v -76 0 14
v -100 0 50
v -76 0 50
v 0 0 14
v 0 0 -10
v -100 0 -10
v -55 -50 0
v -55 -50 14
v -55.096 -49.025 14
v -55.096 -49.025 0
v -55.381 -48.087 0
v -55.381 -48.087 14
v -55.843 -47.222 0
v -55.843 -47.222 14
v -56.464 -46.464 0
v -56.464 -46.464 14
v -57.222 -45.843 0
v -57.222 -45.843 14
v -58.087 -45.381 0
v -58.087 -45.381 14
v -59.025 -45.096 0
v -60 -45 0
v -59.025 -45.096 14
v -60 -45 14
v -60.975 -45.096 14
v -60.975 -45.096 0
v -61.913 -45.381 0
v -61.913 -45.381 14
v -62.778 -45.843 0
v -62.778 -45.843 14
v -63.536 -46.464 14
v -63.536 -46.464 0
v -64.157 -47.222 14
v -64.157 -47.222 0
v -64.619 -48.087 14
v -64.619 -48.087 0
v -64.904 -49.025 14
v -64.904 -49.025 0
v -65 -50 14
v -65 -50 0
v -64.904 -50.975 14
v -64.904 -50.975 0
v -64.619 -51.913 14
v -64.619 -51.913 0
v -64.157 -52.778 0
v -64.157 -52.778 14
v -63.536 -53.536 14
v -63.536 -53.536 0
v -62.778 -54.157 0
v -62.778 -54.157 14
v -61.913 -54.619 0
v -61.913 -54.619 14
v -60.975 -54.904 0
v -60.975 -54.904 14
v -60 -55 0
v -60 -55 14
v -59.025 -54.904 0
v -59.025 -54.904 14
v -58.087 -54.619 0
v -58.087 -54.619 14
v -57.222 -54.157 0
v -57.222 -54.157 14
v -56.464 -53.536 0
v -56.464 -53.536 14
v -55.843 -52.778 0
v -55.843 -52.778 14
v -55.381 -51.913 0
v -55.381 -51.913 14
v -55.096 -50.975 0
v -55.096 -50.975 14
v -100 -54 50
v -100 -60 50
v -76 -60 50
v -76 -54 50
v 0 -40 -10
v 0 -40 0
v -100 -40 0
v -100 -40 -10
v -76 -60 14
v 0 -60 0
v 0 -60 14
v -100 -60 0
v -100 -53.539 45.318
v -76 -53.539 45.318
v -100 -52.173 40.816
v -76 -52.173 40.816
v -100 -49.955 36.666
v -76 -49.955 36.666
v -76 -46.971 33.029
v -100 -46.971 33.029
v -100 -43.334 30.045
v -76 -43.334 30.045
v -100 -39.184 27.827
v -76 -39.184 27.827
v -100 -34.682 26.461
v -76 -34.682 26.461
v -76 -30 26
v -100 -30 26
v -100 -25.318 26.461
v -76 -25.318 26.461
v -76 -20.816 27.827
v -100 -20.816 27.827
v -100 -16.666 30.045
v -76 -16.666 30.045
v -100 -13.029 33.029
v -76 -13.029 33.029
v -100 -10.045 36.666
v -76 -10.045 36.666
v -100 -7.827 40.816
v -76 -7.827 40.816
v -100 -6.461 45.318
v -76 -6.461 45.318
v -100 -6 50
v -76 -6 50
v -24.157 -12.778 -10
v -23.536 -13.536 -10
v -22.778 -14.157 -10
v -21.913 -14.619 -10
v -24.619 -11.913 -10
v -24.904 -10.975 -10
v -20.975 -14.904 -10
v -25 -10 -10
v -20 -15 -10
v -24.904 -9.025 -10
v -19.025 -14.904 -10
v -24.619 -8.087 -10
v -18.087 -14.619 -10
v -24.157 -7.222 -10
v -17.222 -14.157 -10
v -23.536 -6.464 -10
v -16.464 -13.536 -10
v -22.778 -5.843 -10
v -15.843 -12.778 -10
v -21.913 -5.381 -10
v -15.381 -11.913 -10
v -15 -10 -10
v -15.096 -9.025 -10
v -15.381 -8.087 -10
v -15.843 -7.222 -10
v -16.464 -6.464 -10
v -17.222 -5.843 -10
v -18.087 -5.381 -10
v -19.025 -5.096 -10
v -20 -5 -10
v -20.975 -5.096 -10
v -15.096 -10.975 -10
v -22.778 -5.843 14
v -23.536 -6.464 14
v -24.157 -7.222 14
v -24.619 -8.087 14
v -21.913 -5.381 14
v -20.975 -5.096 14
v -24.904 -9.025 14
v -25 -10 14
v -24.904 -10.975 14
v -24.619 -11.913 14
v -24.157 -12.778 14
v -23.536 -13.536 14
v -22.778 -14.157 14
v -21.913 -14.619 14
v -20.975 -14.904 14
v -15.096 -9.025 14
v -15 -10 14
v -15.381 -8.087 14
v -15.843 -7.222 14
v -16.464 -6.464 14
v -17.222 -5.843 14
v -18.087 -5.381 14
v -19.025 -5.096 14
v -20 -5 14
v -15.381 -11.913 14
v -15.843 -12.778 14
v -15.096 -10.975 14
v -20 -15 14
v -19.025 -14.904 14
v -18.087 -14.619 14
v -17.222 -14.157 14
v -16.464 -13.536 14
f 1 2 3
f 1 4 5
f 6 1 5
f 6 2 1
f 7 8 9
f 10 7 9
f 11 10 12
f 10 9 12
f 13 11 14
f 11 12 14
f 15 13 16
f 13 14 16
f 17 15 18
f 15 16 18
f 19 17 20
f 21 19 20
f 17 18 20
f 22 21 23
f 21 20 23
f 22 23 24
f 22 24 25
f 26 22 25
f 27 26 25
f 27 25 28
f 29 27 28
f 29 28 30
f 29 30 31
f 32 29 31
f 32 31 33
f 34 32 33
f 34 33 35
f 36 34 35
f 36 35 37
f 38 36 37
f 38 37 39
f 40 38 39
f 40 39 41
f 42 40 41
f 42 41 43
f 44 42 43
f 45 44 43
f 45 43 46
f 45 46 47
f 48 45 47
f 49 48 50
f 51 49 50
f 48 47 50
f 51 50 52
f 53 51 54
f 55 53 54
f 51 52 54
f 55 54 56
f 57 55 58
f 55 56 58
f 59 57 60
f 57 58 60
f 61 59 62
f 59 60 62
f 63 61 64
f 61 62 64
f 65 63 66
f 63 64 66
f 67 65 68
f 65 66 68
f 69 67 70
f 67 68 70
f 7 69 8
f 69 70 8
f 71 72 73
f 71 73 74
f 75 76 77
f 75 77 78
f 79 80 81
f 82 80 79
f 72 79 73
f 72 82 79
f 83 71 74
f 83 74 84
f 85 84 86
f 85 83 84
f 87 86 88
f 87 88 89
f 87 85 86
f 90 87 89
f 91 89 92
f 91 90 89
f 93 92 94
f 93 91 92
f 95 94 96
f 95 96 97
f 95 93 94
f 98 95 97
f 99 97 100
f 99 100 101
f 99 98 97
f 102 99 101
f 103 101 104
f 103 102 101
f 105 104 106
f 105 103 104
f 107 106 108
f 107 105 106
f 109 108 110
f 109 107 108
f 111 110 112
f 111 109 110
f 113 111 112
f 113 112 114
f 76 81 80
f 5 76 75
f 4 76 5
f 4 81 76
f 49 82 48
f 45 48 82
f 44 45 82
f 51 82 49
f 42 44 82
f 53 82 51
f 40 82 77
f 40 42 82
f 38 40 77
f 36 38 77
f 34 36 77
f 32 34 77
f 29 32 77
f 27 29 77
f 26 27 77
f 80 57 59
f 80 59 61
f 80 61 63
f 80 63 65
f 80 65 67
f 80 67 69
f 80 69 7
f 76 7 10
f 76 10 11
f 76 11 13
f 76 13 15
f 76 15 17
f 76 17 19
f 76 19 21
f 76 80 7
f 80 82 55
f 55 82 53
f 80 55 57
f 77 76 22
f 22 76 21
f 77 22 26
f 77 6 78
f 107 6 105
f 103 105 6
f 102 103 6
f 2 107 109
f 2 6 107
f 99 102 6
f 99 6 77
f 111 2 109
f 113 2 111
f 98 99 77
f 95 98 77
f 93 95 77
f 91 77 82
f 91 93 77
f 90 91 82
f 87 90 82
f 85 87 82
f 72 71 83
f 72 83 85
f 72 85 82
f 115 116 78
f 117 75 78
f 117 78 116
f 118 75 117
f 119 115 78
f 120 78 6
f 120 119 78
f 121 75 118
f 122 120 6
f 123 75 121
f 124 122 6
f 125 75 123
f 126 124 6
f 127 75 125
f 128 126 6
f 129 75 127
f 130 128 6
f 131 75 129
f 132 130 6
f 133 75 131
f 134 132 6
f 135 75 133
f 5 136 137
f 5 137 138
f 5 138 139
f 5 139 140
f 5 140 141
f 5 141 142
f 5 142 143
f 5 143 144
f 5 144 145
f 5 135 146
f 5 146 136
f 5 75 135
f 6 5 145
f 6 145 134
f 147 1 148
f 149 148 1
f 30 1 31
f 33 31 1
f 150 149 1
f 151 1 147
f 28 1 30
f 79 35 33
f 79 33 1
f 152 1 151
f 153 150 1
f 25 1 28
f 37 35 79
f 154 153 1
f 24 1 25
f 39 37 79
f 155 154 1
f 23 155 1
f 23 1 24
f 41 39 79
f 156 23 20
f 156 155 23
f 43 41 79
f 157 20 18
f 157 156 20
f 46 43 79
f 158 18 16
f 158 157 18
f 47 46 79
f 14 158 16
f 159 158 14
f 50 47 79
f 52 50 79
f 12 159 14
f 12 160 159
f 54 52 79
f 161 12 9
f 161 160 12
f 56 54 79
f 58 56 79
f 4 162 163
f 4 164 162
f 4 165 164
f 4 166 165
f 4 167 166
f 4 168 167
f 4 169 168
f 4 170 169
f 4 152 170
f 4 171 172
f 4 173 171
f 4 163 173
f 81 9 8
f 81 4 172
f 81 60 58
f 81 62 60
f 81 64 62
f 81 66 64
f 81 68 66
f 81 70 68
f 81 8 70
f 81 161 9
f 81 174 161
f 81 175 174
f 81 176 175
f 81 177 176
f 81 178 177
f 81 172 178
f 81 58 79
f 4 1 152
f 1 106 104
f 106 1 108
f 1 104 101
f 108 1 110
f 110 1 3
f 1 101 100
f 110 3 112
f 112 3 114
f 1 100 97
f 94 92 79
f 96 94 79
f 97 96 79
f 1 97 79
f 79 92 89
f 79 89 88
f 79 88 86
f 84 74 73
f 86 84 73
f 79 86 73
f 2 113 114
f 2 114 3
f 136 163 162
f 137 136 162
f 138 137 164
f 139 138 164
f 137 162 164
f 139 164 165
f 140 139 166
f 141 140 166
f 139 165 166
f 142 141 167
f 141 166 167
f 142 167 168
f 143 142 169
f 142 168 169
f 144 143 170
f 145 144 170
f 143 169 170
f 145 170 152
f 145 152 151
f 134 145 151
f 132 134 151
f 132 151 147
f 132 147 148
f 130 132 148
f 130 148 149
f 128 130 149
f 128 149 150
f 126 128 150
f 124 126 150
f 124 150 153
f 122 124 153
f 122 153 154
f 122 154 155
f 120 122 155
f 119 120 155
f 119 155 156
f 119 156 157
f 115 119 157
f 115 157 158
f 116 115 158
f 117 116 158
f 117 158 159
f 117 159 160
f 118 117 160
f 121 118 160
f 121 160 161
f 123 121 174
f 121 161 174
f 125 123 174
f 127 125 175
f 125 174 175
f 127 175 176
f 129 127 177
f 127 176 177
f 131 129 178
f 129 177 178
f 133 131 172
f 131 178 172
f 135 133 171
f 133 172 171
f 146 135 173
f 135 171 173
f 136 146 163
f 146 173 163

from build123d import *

# Parameters (mm, degrees)
F1_DEPTH = 100
F3_DEPTH = 24
F4_R     = 5
F5_DEPTH = 25


with BuildPart() as f1:
    # F0 (on Right) → F1 (new body)
    with BuildSketch(Plane.YZ):
        Polygon((-40, -10), (0, -10), (0, 14), (-60, 14), (-60, 0), (-40, 0), align=None)
    extrude(amount=-F1_DEPTH)

    # F2 (on face) → F3 (join)
    with BuildSketch(Plane(origin=(-100, 0, 0), x_dir=(0, -1, 0), z_dir=(-1, 0, 0))):
        with BuildLine():
            Line((0, 50), (0, 14))
            Line((0, 14), (60, 14))
            Line((60, 14), (60, 50))
            Line((60, 50), (54, 50))
            ThreePointArc((54, 50), (30, 26), (6, 50))
            Line((6, 50), (0, 50))
        make_face()
    extrude(amount=-F3_DEPTH)

    # F4 (on face) → F5 (cut)
    with BuildSketch(Plane.XY.offset(14)):
        with Locations((-20, -10)):
            Circle(F4_R)
        with Locations((-60, -50)):
            Circle(F4_R)
    extrude(amount=-F5_DEPTH, mode=Mode.SUBTRACT)


solid = f1.part
